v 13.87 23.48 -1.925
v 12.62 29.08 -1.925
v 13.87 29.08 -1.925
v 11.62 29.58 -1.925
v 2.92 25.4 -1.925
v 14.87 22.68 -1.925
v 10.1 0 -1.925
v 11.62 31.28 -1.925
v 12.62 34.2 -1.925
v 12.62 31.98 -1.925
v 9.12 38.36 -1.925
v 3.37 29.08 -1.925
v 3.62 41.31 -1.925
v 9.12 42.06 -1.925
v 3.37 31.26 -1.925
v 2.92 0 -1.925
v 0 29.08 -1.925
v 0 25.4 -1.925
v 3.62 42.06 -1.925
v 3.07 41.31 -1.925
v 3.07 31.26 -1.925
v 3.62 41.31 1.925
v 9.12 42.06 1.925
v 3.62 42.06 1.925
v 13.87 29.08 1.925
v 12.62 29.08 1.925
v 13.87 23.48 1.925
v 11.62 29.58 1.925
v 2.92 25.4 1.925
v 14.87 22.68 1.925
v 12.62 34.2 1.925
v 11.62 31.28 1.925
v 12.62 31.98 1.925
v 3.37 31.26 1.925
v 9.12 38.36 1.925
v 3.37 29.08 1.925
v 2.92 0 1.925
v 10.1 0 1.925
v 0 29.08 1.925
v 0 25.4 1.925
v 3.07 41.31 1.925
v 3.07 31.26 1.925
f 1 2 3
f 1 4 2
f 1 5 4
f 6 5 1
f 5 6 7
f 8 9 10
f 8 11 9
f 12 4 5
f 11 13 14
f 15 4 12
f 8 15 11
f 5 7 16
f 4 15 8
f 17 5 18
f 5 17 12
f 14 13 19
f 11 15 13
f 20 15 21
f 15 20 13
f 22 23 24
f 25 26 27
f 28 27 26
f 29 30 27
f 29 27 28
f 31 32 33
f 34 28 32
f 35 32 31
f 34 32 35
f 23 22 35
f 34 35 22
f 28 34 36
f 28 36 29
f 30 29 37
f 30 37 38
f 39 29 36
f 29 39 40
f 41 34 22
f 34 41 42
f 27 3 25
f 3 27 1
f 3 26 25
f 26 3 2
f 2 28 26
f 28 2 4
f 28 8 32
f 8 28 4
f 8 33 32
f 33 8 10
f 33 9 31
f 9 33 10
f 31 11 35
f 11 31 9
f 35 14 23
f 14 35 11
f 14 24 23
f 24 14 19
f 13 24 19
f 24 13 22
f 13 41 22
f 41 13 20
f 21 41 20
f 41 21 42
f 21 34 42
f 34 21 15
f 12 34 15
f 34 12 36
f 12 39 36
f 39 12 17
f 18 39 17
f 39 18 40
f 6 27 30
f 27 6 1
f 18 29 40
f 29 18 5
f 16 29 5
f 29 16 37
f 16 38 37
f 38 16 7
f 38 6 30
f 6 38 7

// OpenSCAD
module albero(){
  
a=0;
b=0;





x1=2.92;
y1=b;


//x0=a;//+0.3;
//y0=b;//+0.3;

x0=x1;//+0.3;
y0=25.40;//+0.3;



x2=10.10;
y2=b;

x3=x2+4.77;
y3=y1+22.68;

x4=x3-1;
y4=y3+0.8;

x5=x4;
y5=y4+5.6;

x6=x5-1.25;
y6=y5;

x7=x6-1;
y7=y6+0.5;

x8=x7;
y8=y7+1.7;

x9=x6;
y9=y8+0.7;

x10=x9;
y10=y9+2.22;

x11=x10-3.5;
y11=y10+4.16;

x12=x11;
y12=y11+3.7;

x13=x12-5.50;
y13=y12;

x14=x13;
y14=y13-0.75;

x15=x12-6.05;
y15=y14;

x16=x15;
y16=y13-10.80;

x17=x16+0.3;
y17=y16;

x18=x17;
//y18=y17-2.20;
y18=y6;

x19=a;
y19=y18;

//x19=x18;
//y19=y18-5.19;

//x19=0;
//y19=25.40;

x20=x19;
y20=y0;


triangle_points =[[x0,y0],[x1,y1],[x2,y2],[x3,y3],[x4,y4],[x5,y5],[x6,y6],[x7,y7],[x8,y8],[x9,y9],[x10,y10],[x11,y11],[x12,y12],[x13,y13],[x14,y14],[x15,y15],[x16,y16],[x17,y17],[x18,y18],[x19,y19],[x20,y20]];
triangle_paths =[[0,1,2,3,4,5,6,7,8,9,10,11,12,13,14,15,16,17,18,19,20]];
linear_extrude(height = 3.85, center = true, convexity = 10)
polygon(triangle_points, paths= triangle_paths);

}

module staffa(){
 cube([39,2.90,25.40]);
}

/*
albero();
translate([2.92,0,39/2])
rotate([0,90,90])
staffa();
*/
albero();
    

difference(){
    albero();
translate([-2,0,-5])
cube([20,27,10]);
}
